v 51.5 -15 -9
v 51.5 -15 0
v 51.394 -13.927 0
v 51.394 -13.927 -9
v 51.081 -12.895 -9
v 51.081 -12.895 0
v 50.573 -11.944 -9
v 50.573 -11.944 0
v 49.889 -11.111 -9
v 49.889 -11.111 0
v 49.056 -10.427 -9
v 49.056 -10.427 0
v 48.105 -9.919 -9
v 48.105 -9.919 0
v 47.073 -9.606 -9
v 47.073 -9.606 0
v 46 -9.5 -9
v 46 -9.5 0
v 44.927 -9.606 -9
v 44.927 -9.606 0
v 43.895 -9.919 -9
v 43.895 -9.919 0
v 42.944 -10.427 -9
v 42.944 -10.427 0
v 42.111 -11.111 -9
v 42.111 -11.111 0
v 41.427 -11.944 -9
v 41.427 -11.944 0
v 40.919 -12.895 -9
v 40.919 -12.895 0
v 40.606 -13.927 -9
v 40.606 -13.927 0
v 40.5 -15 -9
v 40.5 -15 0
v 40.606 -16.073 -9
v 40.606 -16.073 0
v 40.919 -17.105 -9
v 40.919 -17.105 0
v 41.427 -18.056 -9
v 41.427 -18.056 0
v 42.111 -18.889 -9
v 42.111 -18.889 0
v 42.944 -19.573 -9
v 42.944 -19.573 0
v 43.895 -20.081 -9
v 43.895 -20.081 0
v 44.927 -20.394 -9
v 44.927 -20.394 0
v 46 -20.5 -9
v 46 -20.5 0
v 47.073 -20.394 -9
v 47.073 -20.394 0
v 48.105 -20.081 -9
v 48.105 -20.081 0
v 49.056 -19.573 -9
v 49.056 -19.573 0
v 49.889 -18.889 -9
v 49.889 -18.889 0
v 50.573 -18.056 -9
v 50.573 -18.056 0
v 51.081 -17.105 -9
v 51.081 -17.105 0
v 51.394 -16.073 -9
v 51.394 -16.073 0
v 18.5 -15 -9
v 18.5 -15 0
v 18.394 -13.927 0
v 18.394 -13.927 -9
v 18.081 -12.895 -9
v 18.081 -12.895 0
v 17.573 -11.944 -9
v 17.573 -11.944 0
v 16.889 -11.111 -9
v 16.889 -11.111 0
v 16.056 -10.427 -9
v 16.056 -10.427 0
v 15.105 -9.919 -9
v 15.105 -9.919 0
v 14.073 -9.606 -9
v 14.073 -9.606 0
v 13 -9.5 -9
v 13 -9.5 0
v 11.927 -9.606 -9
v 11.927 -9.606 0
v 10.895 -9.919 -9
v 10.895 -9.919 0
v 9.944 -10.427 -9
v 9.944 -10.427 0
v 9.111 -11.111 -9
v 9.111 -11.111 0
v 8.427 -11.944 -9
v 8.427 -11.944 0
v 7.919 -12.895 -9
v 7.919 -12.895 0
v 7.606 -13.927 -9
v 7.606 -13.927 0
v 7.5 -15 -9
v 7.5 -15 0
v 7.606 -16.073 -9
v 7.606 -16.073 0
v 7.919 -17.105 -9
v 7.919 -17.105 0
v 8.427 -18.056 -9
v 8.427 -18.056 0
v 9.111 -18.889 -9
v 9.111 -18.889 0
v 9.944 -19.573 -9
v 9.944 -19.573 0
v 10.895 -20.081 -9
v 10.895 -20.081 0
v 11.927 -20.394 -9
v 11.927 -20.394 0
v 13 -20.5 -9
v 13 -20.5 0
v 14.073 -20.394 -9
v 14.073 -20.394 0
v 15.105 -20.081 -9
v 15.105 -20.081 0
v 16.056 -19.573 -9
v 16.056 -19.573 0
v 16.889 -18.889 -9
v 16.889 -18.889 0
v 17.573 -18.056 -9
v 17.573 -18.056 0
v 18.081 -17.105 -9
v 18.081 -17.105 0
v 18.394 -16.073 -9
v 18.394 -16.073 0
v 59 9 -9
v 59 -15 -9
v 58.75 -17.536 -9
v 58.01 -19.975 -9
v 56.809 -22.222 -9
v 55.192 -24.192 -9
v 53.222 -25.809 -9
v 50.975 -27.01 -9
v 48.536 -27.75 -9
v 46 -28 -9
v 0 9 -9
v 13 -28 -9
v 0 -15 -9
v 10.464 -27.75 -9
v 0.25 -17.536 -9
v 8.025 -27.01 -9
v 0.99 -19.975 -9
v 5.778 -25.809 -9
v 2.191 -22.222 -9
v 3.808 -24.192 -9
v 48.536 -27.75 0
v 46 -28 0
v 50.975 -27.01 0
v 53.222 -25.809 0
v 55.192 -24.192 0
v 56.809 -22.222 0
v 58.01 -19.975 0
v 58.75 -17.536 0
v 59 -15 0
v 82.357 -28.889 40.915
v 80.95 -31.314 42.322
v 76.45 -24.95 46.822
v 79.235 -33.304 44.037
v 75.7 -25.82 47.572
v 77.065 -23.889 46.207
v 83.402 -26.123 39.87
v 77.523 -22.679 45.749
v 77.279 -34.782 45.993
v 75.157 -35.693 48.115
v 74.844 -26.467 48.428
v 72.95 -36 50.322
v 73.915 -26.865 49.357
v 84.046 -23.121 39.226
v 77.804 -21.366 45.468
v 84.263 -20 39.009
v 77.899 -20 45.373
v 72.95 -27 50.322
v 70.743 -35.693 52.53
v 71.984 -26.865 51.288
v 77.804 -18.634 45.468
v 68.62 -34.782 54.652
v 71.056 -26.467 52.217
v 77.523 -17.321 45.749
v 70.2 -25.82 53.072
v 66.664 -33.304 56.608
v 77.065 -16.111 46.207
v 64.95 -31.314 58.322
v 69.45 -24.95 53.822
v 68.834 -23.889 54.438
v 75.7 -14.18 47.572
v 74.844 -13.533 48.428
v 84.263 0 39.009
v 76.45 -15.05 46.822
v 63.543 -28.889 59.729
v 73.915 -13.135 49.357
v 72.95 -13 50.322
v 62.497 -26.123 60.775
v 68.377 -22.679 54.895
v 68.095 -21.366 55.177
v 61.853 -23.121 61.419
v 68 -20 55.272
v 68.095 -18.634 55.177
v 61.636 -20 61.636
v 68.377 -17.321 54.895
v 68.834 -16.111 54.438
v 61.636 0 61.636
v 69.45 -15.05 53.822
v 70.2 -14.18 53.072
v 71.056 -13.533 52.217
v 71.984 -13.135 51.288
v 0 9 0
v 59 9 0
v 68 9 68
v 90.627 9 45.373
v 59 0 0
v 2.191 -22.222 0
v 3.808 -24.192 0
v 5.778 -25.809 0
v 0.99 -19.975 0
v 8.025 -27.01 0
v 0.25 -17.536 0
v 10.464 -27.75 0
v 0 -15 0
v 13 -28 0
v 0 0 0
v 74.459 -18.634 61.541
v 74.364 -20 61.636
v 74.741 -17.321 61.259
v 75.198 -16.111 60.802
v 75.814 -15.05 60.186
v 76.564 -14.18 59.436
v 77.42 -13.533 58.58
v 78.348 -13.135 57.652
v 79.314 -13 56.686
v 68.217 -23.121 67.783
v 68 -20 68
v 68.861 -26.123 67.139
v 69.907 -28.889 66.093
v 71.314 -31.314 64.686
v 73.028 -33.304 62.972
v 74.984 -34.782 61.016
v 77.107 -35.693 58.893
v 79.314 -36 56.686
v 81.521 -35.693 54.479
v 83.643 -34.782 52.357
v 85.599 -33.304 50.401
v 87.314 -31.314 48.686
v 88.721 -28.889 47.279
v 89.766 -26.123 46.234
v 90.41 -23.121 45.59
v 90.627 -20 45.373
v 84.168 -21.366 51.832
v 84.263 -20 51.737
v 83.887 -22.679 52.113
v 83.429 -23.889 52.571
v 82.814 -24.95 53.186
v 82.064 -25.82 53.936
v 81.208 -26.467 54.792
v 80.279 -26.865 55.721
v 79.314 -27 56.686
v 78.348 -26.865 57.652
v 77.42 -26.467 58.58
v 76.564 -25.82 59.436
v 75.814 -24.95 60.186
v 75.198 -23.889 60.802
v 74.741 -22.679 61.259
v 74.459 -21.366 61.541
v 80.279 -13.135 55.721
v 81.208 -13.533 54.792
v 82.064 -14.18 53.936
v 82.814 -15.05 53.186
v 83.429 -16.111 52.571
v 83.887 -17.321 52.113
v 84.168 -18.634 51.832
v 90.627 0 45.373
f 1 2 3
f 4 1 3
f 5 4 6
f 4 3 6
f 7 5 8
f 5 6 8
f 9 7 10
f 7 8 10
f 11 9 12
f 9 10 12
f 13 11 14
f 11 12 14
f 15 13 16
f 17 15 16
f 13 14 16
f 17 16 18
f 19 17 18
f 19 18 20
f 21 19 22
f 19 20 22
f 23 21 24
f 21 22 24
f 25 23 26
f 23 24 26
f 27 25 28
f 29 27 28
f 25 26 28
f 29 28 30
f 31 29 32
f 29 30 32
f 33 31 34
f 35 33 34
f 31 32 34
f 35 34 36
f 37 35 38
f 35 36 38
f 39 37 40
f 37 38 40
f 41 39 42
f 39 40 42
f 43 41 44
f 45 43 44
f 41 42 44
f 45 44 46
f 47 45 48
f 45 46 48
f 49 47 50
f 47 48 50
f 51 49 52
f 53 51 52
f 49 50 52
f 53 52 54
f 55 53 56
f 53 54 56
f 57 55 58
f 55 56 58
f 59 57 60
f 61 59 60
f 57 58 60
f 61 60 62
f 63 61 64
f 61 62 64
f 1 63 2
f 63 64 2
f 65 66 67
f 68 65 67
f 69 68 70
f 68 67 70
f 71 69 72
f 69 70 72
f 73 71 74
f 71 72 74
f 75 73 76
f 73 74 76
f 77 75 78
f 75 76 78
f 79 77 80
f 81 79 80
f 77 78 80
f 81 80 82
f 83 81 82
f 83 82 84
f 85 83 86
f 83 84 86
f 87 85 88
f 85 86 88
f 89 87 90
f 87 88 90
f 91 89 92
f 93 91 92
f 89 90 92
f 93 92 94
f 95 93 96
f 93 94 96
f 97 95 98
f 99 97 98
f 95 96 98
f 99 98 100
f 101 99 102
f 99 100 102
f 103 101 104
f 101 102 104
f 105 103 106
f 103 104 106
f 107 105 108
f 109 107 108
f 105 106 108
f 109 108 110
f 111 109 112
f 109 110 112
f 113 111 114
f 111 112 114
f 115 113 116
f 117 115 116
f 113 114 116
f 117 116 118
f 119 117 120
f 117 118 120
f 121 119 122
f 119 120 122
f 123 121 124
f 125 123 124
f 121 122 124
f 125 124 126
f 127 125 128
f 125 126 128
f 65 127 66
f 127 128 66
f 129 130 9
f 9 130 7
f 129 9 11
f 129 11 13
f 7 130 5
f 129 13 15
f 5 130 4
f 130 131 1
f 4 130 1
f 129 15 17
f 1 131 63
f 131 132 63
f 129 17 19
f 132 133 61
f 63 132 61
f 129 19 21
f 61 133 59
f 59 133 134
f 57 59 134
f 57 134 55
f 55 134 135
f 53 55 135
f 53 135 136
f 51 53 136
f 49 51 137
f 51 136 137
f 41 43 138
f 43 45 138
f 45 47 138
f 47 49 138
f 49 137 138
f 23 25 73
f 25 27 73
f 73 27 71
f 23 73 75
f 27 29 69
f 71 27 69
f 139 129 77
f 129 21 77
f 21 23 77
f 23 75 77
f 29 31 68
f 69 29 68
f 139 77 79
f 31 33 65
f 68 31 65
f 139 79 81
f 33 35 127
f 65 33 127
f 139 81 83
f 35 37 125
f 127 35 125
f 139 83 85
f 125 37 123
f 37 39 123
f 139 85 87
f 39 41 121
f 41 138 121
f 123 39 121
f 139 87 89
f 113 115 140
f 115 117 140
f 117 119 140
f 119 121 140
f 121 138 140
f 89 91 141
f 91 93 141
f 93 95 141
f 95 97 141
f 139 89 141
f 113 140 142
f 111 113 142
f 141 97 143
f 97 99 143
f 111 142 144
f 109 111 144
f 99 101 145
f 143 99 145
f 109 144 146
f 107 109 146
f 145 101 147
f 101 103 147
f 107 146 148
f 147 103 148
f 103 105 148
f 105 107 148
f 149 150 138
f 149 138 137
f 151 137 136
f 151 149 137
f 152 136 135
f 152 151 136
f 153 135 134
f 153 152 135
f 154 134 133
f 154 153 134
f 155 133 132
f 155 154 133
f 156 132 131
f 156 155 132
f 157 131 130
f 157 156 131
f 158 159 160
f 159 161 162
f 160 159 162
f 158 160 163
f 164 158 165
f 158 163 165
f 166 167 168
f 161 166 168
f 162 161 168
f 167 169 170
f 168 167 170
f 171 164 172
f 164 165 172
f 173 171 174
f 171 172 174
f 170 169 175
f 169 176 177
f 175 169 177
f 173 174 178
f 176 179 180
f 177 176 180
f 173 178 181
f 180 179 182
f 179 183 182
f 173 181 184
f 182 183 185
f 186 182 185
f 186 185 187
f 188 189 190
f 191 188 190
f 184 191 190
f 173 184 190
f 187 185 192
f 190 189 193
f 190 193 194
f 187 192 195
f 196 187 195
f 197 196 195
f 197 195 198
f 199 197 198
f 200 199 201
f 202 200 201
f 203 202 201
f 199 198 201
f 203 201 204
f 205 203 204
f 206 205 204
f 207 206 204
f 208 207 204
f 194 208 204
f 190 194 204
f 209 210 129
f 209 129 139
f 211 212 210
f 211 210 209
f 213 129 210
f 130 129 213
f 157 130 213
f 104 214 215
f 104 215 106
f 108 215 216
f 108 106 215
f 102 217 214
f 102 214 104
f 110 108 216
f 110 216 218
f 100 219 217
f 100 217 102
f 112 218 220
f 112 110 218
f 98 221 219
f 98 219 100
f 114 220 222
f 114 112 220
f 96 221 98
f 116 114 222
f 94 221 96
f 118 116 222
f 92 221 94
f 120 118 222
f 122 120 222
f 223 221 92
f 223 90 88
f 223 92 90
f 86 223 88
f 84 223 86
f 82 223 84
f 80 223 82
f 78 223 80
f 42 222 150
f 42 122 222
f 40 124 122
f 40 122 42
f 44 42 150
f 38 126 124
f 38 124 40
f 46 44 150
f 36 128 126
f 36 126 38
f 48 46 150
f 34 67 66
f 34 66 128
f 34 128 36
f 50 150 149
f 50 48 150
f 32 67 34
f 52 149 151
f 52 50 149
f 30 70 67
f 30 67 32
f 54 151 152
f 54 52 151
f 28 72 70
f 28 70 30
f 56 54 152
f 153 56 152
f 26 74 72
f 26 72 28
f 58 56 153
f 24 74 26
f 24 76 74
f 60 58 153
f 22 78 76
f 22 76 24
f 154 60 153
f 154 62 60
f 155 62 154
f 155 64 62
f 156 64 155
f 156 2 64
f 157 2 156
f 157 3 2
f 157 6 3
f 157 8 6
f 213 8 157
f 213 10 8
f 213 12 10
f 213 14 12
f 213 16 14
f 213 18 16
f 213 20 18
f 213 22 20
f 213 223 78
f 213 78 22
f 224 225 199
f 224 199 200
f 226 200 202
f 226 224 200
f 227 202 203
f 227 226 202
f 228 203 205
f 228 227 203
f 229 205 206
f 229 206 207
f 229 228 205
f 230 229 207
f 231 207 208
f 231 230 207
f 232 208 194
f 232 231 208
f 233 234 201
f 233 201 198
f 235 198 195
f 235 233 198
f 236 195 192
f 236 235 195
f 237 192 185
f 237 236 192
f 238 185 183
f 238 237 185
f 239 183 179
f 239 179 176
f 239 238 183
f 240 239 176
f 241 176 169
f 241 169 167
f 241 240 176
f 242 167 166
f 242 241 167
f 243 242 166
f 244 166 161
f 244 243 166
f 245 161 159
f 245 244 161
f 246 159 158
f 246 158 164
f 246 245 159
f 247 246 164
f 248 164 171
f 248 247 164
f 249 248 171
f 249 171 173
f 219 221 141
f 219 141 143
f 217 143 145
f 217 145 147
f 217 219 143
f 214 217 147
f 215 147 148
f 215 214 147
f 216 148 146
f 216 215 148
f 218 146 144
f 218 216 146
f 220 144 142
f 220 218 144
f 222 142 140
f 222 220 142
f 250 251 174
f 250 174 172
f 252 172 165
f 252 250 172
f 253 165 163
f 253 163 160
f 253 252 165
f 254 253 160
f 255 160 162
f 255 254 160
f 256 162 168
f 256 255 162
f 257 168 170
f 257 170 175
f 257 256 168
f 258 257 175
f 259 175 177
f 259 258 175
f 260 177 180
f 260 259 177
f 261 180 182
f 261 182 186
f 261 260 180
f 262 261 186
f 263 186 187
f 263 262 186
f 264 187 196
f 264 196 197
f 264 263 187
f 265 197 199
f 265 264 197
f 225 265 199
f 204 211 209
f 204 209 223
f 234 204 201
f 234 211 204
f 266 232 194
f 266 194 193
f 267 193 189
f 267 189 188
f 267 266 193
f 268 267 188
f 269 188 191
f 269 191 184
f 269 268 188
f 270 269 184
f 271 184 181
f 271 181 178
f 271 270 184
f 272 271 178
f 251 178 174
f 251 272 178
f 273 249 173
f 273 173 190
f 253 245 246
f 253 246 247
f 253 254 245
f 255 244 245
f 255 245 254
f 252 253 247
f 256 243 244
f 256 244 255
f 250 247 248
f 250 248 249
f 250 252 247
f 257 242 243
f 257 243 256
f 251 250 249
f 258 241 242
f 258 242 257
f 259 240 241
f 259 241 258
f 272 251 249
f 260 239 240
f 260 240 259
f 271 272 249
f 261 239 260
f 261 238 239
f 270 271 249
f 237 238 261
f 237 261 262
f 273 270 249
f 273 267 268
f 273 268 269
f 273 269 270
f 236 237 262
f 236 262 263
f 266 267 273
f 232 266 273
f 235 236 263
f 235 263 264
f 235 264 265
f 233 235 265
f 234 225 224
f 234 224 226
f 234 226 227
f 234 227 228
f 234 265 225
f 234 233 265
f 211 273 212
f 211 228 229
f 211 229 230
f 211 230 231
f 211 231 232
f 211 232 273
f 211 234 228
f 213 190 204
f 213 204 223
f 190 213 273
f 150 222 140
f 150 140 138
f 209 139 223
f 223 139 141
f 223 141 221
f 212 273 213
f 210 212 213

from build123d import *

# Parameters (mm, degrees)
F0_R     = 5.5
F1_DEPTH = 9
F2_W     = 59
F2_H     = 9
F3_DEPTH = 9
F5_DEPTH = 9


with BuildPart() as f1:
    # F0 (on Top) → F1 (new body)
    with BuildSketch(Plane.XY):
        with BuildLine():
            Line((59, 0), (0, 0))
            Line((0, 0), (0, -15))
            ThreePointArc((0, -15), (3.8076118446, -24.1923881554), (13, -28))
            Line((13, -28), (46, -28))
            ThreePointArc((46, -28), (55.1923881554, -24.1923881554), (59, -15))
            Line((59, -15), (59, 0))
        make_face()
        with Locations((13, -15)):
            Circle(F0_R, mode=Mode.SUBTRACT)
        with Locations((46, -15)):
            Circle(F0_R, mode=Mode.SUBTRACT)
    extrude(amount=-F1_DEPTH)

    # F2 (on face) → F3 (join)
    with BuildSketch(Plane(origin=(0, 0, 0), x_dir=(-1, 0, 0), z_dir=(0, 1, 0))):
        with Locations((-29.5, -4.5)):
            Rectangle(F2_W, F2_H)
        Polygon((0, 0), (-68, 68), (-90.627416998, 45.372583002), (-59, 0), align=None)
    extrude(amount=F3_DEPTH)

    # F4 (on face) → F5 (join)
    with BuildSketch(Plane(origin=(68, 0, 68), x_dir=(0, 1, 0), z_dir=(0.7071067812, 0, 0.7071067812))):
        with BuildLine():
            Line((0, -32), (0, 0))
            Line((0, 0), (-20, 0))
            Line((-20, 0), (-20, -9))
            ThreePointArc((-20, -9), (-15.0502525317, -11.0502525317), (-13, -16))
            ThreePointArc((-13, -16), (-15.0502525317, -20.9497474683), (-20, -23))
            Line((-20, -23), (-20, -32))
            Line((-20, -32), (0, -32))
        make_face()
        with BuildLine():
            Line((-20, -9), (-20, 0))
            ThreePointArc((-20, 0), (-36, -16), (-20, -32))
            Line((-20, -32), (-20, -23))
            ThreePointArc((-20, -23), (-27, -16), (-20, -9))
        make_face()
    extrude(amount=-F5_DEPTH)


solid = f1.part
